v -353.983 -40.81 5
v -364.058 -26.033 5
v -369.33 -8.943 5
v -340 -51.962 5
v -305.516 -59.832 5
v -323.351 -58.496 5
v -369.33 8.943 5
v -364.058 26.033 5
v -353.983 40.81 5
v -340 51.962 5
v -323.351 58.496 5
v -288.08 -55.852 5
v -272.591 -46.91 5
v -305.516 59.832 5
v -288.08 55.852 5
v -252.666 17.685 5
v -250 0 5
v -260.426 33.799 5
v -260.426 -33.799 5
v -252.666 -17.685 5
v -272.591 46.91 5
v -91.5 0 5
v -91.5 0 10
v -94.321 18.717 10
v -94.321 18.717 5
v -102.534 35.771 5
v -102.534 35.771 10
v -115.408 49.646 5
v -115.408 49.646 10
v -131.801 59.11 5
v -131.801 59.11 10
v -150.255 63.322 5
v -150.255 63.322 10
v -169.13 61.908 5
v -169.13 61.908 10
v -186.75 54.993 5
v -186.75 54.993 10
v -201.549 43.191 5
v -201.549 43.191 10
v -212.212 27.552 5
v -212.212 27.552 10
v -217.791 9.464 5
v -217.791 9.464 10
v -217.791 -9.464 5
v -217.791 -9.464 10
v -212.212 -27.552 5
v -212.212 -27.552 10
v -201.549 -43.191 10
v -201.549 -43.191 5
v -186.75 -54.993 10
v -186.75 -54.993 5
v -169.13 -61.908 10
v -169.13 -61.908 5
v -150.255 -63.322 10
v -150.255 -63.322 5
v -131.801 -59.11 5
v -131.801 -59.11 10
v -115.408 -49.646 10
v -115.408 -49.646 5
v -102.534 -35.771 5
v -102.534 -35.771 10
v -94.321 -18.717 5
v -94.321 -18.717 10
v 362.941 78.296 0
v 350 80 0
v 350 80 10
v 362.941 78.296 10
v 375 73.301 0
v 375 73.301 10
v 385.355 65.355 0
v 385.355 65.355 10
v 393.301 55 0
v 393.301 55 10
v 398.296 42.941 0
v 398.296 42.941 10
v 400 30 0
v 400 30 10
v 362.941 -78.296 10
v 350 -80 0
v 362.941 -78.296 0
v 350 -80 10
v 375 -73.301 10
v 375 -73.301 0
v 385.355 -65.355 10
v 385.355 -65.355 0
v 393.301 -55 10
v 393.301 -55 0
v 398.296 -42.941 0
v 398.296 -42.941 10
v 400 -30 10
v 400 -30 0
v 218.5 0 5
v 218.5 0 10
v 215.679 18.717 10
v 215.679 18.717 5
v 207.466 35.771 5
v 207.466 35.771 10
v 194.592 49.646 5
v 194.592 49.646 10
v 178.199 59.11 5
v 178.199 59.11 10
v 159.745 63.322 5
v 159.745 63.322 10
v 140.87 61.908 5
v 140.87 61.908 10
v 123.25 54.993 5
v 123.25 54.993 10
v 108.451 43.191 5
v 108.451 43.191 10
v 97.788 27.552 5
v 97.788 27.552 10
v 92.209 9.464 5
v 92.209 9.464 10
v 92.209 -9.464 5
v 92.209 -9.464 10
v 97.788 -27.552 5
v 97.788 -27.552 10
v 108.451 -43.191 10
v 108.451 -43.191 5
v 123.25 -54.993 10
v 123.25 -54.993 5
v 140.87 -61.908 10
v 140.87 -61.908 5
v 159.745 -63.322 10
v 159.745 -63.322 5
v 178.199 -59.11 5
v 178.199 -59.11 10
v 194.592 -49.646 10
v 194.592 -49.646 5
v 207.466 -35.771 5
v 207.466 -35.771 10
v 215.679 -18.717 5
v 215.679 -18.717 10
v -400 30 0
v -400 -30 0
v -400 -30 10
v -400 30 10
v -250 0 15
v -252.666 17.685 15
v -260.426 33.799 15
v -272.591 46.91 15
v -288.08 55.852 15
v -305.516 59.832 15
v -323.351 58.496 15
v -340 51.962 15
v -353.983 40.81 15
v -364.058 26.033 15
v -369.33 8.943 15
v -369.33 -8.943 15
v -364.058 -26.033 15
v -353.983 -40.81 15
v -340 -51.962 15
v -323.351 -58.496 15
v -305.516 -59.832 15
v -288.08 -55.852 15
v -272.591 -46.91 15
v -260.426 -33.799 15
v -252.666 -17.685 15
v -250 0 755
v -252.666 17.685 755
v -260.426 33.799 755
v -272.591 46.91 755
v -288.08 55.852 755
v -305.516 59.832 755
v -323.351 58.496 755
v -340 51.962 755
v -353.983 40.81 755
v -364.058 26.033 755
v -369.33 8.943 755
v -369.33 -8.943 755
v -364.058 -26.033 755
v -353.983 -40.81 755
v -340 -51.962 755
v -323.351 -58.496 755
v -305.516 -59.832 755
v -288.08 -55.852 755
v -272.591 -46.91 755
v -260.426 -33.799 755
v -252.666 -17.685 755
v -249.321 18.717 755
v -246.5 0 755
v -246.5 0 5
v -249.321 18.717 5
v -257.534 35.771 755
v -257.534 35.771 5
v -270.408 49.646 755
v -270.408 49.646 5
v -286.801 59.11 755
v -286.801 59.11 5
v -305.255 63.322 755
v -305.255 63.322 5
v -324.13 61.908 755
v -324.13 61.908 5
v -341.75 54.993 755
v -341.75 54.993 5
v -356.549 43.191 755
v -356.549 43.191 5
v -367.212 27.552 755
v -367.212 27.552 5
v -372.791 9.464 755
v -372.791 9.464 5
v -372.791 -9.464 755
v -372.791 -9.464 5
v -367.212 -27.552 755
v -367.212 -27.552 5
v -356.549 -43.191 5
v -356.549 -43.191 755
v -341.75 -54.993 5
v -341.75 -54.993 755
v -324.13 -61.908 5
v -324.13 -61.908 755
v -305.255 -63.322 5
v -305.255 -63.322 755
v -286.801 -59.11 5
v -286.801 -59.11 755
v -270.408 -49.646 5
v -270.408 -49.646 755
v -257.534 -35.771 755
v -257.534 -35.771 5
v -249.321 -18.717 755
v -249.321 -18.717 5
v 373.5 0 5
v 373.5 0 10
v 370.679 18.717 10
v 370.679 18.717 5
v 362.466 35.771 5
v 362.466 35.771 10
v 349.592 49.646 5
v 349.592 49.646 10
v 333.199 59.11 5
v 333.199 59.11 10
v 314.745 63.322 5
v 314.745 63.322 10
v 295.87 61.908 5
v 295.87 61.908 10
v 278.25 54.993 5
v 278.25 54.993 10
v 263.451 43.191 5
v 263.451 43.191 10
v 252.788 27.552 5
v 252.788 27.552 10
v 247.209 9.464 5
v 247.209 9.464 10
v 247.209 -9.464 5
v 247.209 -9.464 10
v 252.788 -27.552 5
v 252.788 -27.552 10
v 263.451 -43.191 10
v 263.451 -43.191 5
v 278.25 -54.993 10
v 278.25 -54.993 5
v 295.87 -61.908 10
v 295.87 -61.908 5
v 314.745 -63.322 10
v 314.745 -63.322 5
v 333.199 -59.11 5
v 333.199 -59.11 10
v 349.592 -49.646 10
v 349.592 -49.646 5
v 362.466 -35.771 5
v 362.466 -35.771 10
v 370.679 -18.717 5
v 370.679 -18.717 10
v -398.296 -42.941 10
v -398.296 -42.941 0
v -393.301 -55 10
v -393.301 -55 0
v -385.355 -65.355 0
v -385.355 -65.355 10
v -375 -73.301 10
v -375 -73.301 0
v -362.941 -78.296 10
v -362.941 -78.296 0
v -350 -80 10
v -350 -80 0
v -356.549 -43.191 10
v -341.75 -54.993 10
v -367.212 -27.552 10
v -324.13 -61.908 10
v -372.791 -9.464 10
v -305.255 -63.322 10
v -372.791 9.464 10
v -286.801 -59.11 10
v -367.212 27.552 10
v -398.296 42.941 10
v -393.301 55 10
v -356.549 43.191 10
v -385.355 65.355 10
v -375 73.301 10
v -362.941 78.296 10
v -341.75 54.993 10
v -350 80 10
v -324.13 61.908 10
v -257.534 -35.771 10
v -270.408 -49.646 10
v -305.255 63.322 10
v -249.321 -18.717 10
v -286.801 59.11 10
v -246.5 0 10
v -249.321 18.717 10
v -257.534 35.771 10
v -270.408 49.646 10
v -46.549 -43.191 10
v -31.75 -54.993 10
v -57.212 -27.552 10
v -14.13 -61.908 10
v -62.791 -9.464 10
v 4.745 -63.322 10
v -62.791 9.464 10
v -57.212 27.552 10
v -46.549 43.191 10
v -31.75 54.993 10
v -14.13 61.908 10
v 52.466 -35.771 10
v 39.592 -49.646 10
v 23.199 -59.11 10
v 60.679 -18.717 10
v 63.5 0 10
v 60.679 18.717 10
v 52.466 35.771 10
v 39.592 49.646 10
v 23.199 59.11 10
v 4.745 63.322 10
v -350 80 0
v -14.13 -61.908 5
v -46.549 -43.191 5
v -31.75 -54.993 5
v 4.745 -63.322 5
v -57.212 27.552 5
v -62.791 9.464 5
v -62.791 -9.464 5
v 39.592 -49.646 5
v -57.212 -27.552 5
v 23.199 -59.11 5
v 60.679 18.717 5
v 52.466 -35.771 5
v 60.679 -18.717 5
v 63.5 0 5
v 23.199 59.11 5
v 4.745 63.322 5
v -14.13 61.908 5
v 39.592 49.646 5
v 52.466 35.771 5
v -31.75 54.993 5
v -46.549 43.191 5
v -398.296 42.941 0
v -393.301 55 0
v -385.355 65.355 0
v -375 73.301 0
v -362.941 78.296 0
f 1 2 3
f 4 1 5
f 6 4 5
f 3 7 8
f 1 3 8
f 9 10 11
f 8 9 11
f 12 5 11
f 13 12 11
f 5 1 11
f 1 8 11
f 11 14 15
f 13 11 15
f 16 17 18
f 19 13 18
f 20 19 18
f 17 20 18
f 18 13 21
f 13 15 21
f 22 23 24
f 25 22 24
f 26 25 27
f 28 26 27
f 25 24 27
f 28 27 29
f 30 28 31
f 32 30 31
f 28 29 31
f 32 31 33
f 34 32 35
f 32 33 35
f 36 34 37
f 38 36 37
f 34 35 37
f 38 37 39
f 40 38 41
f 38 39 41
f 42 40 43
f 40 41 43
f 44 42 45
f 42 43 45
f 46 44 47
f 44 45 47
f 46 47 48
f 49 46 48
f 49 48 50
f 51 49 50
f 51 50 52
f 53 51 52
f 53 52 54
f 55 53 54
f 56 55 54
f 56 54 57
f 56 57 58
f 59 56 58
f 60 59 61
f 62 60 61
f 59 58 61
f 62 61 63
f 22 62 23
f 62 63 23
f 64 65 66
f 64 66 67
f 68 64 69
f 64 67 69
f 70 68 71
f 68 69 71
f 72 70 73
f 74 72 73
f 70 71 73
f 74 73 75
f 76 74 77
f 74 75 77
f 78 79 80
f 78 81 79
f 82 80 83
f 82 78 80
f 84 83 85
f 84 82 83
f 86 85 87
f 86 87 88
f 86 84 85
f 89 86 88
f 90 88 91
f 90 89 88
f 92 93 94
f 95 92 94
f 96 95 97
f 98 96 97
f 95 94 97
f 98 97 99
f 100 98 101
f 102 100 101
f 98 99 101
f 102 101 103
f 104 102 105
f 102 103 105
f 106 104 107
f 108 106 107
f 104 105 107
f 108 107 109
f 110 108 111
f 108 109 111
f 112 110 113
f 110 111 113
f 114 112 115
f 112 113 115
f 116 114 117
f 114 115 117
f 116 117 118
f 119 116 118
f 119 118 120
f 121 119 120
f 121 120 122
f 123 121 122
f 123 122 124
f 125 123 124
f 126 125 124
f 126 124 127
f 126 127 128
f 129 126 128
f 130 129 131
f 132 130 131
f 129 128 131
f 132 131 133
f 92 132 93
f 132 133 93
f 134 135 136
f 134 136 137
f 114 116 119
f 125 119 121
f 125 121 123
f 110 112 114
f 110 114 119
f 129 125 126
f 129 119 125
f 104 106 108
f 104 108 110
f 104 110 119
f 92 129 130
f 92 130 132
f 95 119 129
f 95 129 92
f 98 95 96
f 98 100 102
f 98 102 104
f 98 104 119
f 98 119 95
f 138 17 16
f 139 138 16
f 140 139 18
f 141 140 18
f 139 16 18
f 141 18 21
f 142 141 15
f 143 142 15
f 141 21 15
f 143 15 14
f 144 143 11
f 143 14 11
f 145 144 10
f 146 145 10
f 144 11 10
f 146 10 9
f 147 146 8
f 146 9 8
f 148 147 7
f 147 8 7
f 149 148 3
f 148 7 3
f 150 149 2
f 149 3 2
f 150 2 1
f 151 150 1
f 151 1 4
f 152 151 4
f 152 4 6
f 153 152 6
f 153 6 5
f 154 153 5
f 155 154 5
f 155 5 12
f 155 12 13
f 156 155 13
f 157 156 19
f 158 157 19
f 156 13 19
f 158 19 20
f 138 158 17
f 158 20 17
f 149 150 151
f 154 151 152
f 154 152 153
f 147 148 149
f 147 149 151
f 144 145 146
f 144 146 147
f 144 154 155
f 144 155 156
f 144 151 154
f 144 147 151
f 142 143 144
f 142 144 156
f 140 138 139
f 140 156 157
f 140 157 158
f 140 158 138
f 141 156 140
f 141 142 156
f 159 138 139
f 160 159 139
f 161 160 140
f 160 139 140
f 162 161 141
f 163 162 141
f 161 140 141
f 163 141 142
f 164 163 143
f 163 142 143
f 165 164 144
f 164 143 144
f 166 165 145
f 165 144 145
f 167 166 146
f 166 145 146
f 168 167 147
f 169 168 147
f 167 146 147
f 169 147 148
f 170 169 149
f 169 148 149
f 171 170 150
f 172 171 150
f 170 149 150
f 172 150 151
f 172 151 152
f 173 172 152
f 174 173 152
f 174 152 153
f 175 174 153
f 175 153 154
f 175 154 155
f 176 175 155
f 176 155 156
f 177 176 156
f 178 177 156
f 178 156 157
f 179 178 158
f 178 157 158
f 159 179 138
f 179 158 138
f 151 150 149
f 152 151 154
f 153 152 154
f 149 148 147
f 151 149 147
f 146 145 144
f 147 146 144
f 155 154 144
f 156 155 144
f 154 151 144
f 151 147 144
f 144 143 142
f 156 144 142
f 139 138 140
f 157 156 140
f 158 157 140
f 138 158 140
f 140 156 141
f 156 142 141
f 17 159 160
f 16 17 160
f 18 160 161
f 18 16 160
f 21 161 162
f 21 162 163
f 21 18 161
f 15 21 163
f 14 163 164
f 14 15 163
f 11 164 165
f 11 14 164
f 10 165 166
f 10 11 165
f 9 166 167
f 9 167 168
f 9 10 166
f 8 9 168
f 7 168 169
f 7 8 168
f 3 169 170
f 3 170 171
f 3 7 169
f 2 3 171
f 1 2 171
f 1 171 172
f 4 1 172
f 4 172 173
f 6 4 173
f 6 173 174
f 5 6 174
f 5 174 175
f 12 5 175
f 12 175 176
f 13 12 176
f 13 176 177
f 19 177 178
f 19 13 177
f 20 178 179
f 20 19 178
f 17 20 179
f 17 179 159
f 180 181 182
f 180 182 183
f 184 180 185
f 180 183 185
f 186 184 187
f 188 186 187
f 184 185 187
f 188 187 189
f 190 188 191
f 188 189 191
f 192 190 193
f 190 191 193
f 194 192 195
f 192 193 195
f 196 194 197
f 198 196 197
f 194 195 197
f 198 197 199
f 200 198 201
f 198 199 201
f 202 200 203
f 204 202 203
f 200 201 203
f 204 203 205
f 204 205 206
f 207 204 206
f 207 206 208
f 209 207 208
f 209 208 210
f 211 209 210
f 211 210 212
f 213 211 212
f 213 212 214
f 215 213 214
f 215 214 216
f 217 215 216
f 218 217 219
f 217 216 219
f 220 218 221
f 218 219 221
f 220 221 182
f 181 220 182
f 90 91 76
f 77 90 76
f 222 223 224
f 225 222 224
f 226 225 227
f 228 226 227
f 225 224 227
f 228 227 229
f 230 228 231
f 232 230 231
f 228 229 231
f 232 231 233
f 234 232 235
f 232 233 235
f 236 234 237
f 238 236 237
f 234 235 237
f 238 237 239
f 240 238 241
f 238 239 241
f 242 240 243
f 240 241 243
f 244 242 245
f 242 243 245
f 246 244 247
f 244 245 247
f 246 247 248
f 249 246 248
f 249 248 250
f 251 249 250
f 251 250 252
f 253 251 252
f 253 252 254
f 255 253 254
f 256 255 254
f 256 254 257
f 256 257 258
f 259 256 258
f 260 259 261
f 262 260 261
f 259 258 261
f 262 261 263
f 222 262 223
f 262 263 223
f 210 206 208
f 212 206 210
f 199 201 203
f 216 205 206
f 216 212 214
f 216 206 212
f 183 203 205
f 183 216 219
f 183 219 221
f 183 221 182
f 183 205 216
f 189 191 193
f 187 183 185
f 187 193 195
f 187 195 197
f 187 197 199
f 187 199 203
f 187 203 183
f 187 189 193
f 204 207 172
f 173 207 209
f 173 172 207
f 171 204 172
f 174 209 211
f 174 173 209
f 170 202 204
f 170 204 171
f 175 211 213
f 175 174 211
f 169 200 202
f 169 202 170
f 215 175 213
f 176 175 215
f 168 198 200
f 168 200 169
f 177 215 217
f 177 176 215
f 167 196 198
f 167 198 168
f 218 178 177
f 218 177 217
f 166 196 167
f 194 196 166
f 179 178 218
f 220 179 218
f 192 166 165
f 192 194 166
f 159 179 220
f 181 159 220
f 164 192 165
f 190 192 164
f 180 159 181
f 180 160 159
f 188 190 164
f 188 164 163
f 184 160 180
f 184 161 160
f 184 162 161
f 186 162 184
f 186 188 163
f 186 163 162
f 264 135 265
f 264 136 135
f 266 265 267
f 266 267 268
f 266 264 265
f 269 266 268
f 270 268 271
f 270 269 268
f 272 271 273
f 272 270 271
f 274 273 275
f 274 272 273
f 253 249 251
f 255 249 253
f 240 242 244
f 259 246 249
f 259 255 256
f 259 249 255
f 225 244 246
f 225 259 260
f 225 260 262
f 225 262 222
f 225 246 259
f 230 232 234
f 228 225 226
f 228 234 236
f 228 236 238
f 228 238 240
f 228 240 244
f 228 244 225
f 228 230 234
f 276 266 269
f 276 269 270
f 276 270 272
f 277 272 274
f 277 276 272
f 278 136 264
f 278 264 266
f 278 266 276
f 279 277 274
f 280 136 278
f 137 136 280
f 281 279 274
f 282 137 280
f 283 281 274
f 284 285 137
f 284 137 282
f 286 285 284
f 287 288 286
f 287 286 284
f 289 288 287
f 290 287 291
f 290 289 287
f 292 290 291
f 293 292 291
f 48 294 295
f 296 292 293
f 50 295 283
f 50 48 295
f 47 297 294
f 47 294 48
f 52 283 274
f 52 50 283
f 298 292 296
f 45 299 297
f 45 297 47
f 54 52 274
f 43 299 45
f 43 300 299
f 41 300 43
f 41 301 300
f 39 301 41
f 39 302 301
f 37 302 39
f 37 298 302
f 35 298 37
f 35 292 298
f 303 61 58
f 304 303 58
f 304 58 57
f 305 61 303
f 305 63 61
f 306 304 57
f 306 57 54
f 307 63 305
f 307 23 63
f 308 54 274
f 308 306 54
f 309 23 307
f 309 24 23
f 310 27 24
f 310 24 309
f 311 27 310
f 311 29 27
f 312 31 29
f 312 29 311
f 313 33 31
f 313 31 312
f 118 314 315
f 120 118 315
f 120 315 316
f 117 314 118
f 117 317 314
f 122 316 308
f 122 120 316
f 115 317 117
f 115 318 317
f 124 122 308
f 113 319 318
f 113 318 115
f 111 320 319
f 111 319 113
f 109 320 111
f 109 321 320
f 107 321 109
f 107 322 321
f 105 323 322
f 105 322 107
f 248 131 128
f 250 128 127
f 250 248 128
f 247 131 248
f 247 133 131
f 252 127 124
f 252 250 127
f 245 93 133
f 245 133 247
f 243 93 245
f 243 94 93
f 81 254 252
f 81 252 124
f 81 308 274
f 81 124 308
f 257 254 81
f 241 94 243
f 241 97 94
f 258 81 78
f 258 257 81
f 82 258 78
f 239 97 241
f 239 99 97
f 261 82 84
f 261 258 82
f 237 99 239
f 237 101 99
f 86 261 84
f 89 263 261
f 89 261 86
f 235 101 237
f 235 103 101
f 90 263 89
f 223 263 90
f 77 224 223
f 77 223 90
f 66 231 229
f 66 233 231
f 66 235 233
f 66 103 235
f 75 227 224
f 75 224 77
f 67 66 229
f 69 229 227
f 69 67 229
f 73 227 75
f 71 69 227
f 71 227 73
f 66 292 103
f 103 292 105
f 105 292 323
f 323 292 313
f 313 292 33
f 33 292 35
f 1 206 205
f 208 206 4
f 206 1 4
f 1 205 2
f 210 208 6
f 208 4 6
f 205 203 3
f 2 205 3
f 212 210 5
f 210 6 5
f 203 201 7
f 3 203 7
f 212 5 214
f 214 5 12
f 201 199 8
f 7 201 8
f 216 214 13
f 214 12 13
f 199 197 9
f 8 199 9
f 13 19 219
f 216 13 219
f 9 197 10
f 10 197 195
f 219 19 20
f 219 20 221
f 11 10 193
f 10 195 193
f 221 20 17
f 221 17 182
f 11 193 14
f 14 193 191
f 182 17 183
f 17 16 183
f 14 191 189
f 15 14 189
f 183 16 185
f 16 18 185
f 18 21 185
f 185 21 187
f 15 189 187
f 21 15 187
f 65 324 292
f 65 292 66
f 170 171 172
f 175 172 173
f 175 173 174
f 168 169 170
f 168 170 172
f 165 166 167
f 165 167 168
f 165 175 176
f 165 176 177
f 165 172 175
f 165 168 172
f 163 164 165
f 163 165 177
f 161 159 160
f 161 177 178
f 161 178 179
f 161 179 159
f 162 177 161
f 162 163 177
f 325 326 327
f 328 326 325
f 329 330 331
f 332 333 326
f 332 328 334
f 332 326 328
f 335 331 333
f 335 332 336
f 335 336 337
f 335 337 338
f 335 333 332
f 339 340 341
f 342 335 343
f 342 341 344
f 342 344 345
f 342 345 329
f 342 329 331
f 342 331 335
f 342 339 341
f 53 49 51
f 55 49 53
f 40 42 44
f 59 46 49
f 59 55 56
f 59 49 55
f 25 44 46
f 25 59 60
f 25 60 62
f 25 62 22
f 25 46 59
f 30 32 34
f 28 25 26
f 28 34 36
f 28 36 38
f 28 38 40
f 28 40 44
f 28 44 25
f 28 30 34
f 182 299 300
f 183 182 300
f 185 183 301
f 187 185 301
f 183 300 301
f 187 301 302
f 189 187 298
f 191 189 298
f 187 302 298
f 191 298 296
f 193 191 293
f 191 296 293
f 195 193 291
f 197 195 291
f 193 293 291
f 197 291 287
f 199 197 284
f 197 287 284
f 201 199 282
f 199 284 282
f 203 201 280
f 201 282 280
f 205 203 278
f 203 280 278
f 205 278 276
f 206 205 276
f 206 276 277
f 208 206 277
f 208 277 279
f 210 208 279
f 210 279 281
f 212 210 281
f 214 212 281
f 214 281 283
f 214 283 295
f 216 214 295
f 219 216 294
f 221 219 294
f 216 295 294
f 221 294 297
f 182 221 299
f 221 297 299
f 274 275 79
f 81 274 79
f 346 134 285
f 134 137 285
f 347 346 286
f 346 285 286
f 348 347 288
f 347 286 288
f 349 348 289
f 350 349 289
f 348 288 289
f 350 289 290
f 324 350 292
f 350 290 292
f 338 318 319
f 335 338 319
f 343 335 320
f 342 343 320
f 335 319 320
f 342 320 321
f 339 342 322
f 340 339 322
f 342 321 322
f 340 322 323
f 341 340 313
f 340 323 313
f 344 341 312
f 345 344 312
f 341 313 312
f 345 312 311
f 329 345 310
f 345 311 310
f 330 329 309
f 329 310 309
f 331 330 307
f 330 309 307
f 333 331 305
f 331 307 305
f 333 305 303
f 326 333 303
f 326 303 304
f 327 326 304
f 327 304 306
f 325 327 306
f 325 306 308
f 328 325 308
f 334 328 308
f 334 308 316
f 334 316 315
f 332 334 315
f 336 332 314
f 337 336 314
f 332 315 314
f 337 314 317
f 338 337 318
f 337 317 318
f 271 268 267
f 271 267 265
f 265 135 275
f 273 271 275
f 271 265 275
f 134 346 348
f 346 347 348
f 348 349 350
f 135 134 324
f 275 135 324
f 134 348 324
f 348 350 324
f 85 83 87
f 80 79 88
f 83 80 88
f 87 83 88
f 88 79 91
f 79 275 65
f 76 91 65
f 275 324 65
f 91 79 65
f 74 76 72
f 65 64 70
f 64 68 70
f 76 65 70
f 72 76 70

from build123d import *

# Parameters (mm, degrees)
F0_W      = 800
F0_H      = 160
F1_DEPTH  = 10
F2_R      = 63.5
F3_DEPTH  = 5
F4_R      = 50
F5_R      = 60
F6_DEPTH  = 10
F5_R_2    = 63.5
F7_DEPTH  = 750
F6_FACE_R = 60
F8_DEPTH  = 740


with BuildPart() as f1:
    # F0 (on Top) → F1 (new body)
    with BuildSketch(Plane.XY):
        Rectangle(F0_W, F0_H)
    extrude(amount=F1_DEPTH)

    # F2 (on face) → F3 (cut)
    with BuildSketch(Plane.XY.offset(10)):
        with Locations((-310, 0)):
            Circle(F2_R)
        with Locations((-155, 0)):
            Circle(F2_R)
        Circle(F2_R)
        with Locations((155, 0)):
            Circle(F2_R)
        with Locations((310, 0)):
            Circle(F2_R)
    extrude(amount=-F3_DEPTH, mode=Mode.SUBTRACT)

    # F4
    f4_edges = [f1.edges().sort_by_distance(p)[0] for p in [
        (-400, -80, 5),
        (400, -80, 5),
        (400, 80, 5),
        (-400, 80, 5),
    ]]
    fillet(f4_edges, radius=F4_R)


with BuildPart() as f6:
    # F5 (on face) → F6 (new body)
    with BuildSketch(Plane.XY.offset(5)):
        with Locations((-310, 0)):
            Circle(F5_R)
    extrude(amount=F6_DEPTH)


with BuildPart() as f7:
    # F5 (on face) → F7 (new body)
    with BuildSketch(Plane.XY.offset(5)):
        with Locations((-310, 0)):
            Circle(F5_R_2)
        with Locations((-310, 0)):
            Circle(F5_R, mode=Mode.SUBTRACT)
    extrude(amount=F7_DEPTH)


with BuildPart() as f8:
    # F6_face (on face) → F8 (new body)
    with BuildSketch(Plane(origin=(-310, 0, 15), x_dir=(1, 0, 0), z_dir=(0, 0, 1))):
        Circle(F6_FACE_R)
    extrude(amount=F8_DEPTH)


solid = Compound([f1.part, f6.part, f7.part, f8.part])
